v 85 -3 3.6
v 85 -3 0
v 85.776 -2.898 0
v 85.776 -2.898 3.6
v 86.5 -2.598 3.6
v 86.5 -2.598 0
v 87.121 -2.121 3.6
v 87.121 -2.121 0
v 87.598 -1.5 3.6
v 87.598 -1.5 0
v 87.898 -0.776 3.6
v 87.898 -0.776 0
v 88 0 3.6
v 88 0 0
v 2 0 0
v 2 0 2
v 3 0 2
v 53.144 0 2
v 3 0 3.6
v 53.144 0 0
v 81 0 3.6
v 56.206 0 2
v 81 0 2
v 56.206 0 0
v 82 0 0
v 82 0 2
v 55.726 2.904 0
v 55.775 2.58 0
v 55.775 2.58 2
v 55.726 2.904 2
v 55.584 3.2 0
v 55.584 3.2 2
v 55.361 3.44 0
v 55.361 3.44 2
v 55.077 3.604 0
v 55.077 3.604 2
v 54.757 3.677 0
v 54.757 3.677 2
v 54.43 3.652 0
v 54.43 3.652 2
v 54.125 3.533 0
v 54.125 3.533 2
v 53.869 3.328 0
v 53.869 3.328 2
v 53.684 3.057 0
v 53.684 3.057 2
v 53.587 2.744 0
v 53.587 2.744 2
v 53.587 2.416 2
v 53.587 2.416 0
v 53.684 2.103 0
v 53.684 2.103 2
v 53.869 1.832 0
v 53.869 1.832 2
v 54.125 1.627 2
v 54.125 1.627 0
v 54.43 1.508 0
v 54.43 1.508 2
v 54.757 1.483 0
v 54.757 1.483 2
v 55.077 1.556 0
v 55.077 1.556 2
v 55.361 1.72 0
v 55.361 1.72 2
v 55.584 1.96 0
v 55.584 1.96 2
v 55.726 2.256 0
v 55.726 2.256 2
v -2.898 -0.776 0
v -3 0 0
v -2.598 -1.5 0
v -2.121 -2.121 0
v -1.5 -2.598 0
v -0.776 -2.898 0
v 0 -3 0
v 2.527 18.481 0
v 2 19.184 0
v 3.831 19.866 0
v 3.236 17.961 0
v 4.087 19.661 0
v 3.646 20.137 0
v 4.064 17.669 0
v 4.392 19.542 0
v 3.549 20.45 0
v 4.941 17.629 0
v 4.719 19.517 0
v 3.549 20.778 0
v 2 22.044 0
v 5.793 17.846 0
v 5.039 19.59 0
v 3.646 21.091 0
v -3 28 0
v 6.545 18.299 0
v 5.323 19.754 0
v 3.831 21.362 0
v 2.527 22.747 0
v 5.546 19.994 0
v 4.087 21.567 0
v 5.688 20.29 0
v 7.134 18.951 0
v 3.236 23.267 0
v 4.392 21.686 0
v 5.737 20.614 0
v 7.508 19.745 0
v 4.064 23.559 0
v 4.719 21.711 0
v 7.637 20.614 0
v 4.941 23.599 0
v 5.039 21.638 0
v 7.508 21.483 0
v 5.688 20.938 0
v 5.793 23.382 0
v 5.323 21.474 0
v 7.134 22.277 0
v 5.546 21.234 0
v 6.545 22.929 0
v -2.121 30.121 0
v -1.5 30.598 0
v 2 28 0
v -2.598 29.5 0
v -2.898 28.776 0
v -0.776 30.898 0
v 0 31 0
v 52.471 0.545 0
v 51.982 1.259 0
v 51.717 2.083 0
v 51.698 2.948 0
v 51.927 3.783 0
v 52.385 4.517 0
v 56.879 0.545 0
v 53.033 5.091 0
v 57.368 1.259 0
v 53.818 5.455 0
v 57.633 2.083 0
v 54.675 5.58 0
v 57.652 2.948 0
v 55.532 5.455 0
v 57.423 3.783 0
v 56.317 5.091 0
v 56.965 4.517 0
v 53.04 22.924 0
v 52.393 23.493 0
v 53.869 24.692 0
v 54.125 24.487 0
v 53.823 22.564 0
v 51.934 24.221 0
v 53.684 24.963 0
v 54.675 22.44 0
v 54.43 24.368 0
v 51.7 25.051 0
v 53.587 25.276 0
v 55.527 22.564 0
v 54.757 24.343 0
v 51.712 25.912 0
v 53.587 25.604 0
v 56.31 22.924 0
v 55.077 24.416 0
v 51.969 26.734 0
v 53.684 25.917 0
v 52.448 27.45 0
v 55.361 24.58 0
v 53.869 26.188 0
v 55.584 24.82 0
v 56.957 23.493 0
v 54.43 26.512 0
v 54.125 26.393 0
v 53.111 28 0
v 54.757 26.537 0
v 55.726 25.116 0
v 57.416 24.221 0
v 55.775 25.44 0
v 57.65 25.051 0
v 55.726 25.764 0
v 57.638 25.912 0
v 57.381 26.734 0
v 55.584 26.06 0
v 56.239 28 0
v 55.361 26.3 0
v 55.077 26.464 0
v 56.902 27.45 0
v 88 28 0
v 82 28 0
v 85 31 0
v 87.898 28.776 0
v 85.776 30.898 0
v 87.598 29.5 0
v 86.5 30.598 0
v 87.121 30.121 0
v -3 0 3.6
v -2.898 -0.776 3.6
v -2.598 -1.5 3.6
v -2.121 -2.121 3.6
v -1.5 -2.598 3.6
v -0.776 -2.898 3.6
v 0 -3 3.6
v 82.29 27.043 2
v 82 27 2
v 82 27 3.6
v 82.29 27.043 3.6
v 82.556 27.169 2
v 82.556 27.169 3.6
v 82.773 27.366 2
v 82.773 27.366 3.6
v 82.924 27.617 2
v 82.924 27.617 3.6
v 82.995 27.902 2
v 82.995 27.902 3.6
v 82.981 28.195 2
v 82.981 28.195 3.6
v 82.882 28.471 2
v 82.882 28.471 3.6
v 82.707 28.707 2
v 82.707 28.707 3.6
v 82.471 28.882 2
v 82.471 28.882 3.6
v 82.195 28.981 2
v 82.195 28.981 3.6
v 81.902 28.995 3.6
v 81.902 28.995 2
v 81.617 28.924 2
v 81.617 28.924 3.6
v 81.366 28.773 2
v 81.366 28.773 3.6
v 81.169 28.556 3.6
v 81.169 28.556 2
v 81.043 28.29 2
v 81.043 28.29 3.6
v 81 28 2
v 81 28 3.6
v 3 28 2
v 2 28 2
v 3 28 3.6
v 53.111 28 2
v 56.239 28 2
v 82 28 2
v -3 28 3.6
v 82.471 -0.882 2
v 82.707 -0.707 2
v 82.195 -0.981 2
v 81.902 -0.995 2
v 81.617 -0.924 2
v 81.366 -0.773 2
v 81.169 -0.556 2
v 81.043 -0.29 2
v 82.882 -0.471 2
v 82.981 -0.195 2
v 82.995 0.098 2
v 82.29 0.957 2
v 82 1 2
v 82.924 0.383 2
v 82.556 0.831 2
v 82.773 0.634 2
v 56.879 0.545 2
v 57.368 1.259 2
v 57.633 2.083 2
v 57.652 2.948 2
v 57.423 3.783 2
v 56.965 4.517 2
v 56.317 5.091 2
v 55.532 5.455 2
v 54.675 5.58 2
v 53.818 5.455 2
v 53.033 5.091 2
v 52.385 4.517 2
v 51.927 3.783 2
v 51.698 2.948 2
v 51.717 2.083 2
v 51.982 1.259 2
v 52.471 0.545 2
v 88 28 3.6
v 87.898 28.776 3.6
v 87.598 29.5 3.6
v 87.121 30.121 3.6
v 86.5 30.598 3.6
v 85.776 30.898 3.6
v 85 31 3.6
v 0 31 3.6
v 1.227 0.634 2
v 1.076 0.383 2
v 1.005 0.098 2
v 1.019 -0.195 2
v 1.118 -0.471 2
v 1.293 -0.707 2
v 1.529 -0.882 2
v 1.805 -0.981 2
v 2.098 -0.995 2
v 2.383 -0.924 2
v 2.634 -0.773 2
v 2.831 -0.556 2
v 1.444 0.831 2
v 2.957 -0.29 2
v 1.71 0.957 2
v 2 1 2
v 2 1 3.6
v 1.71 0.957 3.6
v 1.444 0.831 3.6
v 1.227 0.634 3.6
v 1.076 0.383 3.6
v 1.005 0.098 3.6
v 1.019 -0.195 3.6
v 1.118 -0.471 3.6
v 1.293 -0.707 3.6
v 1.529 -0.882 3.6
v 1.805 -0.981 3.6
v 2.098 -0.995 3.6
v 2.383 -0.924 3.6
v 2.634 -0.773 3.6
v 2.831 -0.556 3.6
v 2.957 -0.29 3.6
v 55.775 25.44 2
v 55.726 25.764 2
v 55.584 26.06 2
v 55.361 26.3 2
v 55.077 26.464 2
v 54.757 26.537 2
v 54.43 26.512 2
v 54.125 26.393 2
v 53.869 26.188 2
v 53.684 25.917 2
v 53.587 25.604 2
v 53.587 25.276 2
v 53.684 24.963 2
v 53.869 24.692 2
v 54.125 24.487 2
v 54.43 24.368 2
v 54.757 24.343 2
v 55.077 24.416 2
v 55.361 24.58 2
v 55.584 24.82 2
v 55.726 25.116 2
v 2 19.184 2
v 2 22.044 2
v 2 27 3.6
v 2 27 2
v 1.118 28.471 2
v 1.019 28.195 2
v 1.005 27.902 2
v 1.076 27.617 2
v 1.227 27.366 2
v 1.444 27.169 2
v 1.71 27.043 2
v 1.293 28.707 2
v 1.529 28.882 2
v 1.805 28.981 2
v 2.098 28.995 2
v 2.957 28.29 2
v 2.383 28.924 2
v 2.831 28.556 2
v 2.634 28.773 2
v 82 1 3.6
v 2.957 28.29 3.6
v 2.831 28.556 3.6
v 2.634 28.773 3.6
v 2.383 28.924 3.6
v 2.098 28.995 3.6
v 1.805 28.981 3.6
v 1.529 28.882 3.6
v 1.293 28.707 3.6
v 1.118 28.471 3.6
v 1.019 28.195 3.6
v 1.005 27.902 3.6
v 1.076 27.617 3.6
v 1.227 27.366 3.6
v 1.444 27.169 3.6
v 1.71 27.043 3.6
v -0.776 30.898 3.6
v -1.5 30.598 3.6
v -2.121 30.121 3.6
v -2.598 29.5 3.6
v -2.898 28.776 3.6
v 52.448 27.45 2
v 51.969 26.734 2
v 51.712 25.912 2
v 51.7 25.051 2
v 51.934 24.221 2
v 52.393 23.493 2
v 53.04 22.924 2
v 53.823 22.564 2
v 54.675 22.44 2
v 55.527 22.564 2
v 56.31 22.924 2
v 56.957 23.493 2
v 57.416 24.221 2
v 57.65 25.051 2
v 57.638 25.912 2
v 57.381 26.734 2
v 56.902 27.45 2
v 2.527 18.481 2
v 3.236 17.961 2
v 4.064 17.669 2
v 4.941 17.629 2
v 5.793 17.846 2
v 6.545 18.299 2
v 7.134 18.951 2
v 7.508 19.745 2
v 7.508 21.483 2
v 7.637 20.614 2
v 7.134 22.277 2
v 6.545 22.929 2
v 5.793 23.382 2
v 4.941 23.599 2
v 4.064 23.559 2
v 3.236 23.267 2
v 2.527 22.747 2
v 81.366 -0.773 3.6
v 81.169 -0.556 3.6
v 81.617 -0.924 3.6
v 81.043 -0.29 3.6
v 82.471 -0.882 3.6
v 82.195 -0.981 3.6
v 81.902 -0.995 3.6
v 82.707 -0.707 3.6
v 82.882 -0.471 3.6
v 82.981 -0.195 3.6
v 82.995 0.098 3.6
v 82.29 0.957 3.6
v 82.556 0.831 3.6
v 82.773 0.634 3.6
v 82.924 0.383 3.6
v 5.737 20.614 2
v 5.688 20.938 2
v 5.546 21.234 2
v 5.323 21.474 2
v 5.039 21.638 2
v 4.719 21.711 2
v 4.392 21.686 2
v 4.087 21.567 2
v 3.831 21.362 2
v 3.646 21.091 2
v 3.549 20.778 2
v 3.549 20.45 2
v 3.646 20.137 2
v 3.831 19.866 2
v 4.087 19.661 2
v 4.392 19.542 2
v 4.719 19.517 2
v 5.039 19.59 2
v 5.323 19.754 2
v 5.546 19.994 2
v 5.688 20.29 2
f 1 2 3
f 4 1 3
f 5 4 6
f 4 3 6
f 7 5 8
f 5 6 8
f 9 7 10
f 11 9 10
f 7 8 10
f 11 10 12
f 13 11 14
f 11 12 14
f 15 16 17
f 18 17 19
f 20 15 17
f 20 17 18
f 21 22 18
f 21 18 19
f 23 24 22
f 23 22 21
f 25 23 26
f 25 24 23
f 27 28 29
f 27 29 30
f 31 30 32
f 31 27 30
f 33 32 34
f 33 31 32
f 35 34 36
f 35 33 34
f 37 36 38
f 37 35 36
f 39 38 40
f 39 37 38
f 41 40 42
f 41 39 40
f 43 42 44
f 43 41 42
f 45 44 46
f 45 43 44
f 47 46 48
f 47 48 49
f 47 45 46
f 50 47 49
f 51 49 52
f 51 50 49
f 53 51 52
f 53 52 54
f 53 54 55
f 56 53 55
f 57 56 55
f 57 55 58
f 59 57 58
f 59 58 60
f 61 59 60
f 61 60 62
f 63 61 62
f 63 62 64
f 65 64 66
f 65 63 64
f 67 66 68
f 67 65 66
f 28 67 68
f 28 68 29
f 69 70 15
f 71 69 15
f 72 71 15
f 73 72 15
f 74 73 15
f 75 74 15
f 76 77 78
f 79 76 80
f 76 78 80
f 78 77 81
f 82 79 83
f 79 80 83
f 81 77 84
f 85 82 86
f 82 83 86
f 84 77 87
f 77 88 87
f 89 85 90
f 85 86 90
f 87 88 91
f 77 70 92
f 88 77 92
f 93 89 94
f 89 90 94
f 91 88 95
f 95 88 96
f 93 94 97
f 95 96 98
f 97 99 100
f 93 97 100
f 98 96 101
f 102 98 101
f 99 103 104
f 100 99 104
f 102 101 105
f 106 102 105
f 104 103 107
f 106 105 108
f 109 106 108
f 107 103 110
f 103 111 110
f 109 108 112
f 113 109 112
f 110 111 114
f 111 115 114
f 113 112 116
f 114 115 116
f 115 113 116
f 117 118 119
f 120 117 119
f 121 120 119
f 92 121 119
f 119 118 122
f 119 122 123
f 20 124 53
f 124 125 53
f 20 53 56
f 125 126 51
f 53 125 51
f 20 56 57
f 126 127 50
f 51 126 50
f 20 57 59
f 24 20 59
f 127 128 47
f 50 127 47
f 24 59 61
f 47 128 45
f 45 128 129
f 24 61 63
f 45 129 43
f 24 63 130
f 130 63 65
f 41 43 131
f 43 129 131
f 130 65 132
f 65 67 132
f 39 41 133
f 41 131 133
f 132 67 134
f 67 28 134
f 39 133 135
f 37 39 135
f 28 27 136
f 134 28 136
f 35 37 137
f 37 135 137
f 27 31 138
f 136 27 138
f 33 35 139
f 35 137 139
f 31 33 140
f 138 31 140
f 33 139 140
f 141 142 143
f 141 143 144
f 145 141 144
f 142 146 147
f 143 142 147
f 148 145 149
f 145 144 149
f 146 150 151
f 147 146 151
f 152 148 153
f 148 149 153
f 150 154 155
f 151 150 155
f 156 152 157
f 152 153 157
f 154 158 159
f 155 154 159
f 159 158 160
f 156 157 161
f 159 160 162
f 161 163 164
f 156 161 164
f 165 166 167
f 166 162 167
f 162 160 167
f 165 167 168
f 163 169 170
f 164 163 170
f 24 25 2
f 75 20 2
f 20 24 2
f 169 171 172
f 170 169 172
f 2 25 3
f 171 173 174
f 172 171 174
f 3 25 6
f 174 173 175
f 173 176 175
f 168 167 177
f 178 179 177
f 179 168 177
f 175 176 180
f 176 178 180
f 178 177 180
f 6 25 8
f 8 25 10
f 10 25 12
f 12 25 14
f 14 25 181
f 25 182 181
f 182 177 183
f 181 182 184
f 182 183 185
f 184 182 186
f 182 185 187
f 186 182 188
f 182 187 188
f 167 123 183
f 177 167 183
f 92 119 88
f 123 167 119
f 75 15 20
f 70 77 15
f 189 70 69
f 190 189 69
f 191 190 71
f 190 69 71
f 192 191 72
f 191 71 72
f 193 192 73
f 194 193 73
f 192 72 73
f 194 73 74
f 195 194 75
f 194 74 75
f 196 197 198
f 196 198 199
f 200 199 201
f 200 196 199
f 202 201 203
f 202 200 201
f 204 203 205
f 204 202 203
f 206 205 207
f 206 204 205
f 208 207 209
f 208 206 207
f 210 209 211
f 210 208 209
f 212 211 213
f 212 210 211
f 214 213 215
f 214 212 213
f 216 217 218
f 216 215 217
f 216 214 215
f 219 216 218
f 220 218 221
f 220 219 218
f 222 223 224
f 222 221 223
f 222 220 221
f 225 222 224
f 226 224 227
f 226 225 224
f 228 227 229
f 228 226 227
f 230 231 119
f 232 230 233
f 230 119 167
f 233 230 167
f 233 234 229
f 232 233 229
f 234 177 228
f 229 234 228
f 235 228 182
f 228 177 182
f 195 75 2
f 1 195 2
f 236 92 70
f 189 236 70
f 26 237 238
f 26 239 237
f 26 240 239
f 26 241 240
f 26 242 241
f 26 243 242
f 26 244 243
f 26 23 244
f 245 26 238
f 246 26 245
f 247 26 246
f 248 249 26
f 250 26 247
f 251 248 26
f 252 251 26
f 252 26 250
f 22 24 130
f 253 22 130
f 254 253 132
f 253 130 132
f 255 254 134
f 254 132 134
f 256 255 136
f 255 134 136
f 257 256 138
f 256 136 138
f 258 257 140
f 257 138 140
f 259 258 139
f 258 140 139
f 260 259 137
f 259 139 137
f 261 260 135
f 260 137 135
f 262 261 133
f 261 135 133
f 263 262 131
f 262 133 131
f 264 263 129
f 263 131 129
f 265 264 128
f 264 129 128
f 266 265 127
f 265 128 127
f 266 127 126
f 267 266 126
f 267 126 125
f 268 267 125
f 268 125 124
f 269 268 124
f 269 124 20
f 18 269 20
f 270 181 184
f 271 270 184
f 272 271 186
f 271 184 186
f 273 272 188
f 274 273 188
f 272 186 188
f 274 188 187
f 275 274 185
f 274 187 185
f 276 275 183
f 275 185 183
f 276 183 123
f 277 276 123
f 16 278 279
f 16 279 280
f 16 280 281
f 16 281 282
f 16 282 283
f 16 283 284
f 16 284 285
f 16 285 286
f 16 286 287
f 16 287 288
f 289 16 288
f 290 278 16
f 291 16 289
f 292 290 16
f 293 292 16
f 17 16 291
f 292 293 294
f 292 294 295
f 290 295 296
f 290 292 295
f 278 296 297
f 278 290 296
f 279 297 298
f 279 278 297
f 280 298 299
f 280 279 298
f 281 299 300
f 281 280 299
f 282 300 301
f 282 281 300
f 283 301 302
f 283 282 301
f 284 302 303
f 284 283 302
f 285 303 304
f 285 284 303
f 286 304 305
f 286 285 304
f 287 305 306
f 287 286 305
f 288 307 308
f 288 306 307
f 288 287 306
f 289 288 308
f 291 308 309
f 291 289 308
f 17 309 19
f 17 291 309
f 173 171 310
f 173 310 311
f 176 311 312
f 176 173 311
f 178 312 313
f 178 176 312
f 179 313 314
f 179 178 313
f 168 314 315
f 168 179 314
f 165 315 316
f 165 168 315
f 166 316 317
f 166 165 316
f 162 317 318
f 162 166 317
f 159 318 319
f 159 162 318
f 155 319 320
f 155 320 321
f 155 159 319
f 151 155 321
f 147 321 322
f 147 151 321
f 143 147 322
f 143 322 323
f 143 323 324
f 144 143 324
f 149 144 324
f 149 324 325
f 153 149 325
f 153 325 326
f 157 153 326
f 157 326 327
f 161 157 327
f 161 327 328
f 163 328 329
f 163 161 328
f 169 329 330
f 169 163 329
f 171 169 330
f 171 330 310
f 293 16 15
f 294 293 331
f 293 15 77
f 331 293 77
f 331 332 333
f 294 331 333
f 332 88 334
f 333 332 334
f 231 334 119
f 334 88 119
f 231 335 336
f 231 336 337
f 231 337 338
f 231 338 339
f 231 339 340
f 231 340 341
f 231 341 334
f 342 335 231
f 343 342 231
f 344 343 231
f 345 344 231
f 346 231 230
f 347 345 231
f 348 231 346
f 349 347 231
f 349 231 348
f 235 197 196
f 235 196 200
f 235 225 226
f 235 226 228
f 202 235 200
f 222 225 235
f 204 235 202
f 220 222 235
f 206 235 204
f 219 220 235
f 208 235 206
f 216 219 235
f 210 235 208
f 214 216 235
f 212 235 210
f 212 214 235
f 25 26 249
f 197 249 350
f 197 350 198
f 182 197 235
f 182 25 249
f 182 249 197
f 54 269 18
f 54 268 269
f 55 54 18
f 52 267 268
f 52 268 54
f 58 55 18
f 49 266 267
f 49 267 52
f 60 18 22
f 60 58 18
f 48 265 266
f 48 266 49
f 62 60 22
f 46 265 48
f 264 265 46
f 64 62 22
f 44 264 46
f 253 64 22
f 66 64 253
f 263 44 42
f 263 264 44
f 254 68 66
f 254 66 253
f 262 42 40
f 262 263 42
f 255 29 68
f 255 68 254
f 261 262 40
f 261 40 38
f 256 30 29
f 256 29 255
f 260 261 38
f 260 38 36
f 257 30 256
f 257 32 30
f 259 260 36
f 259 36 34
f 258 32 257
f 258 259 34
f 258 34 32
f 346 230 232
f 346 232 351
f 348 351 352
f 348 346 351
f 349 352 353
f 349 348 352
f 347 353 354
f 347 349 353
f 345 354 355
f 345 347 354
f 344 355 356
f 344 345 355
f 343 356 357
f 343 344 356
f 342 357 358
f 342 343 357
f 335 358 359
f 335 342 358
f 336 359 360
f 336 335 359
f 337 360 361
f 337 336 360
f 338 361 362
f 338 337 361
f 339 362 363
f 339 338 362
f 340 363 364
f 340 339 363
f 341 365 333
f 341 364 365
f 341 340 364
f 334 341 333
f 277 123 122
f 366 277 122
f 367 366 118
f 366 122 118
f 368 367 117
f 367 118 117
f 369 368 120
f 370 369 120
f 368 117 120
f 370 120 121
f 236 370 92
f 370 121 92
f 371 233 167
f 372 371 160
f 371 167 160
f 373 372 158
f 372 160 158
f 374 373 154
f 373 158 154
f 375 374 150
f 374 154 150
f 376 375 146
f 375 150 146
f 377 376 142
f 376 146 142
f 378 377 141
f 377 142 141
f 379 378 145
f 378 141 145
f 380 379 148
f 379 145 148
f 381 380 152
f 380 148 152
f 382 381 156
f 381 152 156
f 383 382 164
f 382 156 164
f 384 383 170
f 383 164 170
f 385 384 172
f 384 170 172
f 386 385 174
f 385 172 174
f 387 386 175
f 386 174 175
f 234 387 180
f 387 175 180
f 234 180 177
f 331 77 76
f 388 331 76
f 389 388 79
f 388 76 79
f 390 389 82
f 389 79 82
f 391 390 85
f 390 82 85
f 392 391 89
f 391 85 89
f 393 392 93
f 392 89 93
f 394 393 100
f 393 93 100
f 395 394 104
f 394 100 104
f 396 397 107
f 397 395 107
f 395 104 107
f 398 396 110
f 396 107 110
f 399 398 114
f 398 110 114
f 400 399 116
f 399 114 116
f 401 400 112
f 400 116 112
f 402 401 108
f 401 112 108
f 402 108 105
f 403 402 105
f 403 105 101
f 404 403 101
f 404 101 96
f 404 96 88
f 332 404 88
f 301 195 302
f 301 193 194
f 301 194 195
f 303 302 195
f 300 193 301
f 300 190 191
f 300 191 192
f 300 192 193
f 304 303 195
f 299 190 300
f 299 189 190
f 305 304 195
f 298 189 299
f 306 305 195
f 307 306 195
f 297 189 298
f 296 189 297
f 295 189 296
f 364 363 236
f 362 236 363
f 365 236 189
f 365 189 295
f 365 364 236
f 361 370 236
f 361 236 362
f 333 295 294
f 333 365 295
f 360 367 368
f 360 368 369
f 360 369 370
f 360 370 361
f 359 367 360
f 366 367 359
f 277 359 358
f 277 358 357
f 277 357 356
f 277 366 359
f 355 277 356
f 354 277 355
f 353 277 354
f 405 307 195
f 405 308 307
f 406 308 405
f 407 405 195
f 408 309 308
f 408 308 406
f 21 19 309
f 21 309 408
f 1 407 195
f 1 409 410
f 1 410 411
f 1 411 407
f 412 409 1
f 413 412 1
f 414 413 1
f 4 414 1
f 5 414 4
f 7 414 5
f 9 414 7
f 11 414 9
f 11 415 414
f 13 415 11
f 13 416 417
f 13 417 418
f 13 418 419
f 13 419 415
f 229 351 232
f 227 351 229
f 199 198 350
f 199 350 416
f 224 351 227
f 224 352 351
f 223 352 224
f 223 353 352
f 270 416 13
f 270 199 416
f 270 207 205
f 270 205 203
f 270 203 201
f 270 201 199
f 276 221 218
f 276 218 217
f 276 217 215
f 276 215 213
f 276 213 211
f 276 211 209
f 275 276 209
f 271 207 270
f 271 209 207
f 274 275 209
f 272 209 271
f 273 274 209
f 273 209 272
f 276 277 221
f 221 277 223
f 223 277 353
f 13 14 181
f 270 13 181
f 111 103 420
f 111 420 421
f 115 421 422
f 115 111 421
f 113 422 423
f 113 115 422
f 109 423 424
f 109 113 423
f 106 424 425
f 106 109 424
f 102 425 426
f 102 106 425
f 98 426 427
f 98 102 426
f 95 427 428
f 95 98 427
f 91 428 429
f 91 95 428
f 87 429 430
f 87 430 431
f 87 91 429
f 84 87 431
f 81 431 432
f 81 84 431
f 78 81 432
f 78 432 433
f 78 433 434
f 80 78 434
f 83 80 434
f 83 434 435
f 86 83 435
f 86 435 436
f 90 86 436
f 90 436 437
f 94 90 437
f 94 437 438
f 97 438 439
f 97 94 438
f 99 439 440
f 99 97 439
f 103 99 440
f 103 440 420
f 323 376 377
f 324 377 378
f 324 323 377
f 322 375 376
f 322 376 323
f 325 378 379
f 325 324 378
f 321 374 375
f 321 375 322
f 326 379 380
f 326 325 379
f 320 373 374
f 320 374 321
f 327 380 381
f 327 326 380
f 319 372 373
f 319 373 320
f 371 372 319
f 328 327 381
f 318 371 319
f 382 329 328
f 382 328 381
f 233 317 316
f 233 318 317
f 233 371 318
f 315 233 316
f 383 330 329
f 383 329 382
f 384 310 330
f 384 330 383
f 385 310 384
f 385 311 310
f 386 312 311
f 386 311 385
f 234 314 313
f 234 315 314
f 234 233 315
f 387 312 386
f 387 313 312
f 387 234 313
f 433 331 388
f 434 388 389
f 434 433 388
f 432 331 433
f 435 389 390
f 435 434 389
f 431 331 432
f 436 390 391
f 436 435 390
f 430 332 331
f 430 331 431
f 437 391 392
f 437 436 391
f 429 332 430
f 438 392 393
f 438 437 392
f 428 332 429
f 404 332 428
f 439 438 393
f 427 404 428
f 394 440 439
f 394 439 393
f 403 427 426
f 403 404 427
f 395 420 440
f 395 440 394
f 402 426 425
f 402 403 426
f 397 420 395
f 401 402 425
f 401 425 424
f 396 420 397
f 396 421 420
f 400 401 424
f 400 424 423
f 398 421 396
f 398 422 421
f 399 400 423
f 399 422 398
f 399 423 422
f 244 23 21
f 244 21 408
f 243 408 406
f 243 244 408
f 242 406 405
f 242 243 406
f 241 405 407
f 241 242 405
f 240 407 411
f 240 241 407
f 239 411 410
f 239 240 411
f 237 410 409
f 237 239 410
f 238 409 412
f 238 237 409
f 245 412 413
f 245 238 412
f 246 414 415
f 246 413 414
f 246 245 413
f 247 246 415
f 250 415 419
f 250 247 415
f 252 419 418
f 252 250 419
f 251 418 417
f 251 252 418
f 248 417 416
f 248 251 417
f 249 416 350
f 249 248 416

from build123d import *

# Parameters (mm, degrees)
SKETCH013_W     = 80
SKETCH013_H     = 28
PAD007_DEPTH    = 3.6
SKETCH014_R     = 3
SKETCH014_R_2   = 1.1
PAD008_DEPTH    = 2
SKETCH016_R     = 1
POCKET003_DEPTH = 5


with BuildPart() as part:
    # Sketch013 → Pad007 (new body)
    with BuildSketch(Plane.XY):
        with BuildLine():
            Line((0, -3), (85, -3))
            ThreePointArc((85, -3), (87.12132, -2.12132), (88, 0))
            Line((88, 0), (88, 28))
            ThreePointArc((88, 28), (87.12132, 30.12132), (85, 31))
            Line((85, 31), (0, 31))
            ThreePointArc((0, 31), (-2.12132, 30.12132), (-3, 28))
            Line((-3, 28), (-3, 0))
            ThreePointArc((-3, 0), (-2.12132, -2.12132), (0, -3))
        make_face()
        with Locations((42, 14)):
            Rectangle(SKETCH013_W, SKETCH013_H, mode=Mode.SUBTRACT)
    extrude(amount=PAD007_DEPTH)

    # Sketch014 → Pad008 (join)
    with BuildSketch(Plane.XY):
        with Locations((4.637, 20.614)):
            Circle(SKETCH014_R)
        with Locations((4.637, 20.614)):
            Circle(SKETCH014_R_2, mode=Mode.SUBTRACT)
        with Locations((54.675, 25.44)):
            Circle(SKETCH014_R)
        with Locations((54.675, 25.44)):
            Circle(SKETCH014_R_2, mode=Mode.SUBTRACT)
        with Locations((54.675, 2.58)):
            Circle(SKETCH014_R)
        with Locations((54.675, 2.58)):
            Circle(SKETCH014_R_2, mode=Mode.SUBTRACT)
    extrude(amount=PAD008_DEPTH)

    # Sketch016 → Pocket003 (cut)
    with BuildSketch(Plane.XY.offset(2)):
        with Locations((2, 28)):
            Circle(SKETCH016_R)
        with Locations((82, 28)):
            Circle(SKETCH016_R)
        with Locations((82, 0)):
            Circle(SKETCH016_R)
        with Locations((2, 0)):
            Circle(SKETCH016_R)
    extrude(amount=POCKET003_DEPTH, mode=Mode.SUBTRACT)


solid = part.part
